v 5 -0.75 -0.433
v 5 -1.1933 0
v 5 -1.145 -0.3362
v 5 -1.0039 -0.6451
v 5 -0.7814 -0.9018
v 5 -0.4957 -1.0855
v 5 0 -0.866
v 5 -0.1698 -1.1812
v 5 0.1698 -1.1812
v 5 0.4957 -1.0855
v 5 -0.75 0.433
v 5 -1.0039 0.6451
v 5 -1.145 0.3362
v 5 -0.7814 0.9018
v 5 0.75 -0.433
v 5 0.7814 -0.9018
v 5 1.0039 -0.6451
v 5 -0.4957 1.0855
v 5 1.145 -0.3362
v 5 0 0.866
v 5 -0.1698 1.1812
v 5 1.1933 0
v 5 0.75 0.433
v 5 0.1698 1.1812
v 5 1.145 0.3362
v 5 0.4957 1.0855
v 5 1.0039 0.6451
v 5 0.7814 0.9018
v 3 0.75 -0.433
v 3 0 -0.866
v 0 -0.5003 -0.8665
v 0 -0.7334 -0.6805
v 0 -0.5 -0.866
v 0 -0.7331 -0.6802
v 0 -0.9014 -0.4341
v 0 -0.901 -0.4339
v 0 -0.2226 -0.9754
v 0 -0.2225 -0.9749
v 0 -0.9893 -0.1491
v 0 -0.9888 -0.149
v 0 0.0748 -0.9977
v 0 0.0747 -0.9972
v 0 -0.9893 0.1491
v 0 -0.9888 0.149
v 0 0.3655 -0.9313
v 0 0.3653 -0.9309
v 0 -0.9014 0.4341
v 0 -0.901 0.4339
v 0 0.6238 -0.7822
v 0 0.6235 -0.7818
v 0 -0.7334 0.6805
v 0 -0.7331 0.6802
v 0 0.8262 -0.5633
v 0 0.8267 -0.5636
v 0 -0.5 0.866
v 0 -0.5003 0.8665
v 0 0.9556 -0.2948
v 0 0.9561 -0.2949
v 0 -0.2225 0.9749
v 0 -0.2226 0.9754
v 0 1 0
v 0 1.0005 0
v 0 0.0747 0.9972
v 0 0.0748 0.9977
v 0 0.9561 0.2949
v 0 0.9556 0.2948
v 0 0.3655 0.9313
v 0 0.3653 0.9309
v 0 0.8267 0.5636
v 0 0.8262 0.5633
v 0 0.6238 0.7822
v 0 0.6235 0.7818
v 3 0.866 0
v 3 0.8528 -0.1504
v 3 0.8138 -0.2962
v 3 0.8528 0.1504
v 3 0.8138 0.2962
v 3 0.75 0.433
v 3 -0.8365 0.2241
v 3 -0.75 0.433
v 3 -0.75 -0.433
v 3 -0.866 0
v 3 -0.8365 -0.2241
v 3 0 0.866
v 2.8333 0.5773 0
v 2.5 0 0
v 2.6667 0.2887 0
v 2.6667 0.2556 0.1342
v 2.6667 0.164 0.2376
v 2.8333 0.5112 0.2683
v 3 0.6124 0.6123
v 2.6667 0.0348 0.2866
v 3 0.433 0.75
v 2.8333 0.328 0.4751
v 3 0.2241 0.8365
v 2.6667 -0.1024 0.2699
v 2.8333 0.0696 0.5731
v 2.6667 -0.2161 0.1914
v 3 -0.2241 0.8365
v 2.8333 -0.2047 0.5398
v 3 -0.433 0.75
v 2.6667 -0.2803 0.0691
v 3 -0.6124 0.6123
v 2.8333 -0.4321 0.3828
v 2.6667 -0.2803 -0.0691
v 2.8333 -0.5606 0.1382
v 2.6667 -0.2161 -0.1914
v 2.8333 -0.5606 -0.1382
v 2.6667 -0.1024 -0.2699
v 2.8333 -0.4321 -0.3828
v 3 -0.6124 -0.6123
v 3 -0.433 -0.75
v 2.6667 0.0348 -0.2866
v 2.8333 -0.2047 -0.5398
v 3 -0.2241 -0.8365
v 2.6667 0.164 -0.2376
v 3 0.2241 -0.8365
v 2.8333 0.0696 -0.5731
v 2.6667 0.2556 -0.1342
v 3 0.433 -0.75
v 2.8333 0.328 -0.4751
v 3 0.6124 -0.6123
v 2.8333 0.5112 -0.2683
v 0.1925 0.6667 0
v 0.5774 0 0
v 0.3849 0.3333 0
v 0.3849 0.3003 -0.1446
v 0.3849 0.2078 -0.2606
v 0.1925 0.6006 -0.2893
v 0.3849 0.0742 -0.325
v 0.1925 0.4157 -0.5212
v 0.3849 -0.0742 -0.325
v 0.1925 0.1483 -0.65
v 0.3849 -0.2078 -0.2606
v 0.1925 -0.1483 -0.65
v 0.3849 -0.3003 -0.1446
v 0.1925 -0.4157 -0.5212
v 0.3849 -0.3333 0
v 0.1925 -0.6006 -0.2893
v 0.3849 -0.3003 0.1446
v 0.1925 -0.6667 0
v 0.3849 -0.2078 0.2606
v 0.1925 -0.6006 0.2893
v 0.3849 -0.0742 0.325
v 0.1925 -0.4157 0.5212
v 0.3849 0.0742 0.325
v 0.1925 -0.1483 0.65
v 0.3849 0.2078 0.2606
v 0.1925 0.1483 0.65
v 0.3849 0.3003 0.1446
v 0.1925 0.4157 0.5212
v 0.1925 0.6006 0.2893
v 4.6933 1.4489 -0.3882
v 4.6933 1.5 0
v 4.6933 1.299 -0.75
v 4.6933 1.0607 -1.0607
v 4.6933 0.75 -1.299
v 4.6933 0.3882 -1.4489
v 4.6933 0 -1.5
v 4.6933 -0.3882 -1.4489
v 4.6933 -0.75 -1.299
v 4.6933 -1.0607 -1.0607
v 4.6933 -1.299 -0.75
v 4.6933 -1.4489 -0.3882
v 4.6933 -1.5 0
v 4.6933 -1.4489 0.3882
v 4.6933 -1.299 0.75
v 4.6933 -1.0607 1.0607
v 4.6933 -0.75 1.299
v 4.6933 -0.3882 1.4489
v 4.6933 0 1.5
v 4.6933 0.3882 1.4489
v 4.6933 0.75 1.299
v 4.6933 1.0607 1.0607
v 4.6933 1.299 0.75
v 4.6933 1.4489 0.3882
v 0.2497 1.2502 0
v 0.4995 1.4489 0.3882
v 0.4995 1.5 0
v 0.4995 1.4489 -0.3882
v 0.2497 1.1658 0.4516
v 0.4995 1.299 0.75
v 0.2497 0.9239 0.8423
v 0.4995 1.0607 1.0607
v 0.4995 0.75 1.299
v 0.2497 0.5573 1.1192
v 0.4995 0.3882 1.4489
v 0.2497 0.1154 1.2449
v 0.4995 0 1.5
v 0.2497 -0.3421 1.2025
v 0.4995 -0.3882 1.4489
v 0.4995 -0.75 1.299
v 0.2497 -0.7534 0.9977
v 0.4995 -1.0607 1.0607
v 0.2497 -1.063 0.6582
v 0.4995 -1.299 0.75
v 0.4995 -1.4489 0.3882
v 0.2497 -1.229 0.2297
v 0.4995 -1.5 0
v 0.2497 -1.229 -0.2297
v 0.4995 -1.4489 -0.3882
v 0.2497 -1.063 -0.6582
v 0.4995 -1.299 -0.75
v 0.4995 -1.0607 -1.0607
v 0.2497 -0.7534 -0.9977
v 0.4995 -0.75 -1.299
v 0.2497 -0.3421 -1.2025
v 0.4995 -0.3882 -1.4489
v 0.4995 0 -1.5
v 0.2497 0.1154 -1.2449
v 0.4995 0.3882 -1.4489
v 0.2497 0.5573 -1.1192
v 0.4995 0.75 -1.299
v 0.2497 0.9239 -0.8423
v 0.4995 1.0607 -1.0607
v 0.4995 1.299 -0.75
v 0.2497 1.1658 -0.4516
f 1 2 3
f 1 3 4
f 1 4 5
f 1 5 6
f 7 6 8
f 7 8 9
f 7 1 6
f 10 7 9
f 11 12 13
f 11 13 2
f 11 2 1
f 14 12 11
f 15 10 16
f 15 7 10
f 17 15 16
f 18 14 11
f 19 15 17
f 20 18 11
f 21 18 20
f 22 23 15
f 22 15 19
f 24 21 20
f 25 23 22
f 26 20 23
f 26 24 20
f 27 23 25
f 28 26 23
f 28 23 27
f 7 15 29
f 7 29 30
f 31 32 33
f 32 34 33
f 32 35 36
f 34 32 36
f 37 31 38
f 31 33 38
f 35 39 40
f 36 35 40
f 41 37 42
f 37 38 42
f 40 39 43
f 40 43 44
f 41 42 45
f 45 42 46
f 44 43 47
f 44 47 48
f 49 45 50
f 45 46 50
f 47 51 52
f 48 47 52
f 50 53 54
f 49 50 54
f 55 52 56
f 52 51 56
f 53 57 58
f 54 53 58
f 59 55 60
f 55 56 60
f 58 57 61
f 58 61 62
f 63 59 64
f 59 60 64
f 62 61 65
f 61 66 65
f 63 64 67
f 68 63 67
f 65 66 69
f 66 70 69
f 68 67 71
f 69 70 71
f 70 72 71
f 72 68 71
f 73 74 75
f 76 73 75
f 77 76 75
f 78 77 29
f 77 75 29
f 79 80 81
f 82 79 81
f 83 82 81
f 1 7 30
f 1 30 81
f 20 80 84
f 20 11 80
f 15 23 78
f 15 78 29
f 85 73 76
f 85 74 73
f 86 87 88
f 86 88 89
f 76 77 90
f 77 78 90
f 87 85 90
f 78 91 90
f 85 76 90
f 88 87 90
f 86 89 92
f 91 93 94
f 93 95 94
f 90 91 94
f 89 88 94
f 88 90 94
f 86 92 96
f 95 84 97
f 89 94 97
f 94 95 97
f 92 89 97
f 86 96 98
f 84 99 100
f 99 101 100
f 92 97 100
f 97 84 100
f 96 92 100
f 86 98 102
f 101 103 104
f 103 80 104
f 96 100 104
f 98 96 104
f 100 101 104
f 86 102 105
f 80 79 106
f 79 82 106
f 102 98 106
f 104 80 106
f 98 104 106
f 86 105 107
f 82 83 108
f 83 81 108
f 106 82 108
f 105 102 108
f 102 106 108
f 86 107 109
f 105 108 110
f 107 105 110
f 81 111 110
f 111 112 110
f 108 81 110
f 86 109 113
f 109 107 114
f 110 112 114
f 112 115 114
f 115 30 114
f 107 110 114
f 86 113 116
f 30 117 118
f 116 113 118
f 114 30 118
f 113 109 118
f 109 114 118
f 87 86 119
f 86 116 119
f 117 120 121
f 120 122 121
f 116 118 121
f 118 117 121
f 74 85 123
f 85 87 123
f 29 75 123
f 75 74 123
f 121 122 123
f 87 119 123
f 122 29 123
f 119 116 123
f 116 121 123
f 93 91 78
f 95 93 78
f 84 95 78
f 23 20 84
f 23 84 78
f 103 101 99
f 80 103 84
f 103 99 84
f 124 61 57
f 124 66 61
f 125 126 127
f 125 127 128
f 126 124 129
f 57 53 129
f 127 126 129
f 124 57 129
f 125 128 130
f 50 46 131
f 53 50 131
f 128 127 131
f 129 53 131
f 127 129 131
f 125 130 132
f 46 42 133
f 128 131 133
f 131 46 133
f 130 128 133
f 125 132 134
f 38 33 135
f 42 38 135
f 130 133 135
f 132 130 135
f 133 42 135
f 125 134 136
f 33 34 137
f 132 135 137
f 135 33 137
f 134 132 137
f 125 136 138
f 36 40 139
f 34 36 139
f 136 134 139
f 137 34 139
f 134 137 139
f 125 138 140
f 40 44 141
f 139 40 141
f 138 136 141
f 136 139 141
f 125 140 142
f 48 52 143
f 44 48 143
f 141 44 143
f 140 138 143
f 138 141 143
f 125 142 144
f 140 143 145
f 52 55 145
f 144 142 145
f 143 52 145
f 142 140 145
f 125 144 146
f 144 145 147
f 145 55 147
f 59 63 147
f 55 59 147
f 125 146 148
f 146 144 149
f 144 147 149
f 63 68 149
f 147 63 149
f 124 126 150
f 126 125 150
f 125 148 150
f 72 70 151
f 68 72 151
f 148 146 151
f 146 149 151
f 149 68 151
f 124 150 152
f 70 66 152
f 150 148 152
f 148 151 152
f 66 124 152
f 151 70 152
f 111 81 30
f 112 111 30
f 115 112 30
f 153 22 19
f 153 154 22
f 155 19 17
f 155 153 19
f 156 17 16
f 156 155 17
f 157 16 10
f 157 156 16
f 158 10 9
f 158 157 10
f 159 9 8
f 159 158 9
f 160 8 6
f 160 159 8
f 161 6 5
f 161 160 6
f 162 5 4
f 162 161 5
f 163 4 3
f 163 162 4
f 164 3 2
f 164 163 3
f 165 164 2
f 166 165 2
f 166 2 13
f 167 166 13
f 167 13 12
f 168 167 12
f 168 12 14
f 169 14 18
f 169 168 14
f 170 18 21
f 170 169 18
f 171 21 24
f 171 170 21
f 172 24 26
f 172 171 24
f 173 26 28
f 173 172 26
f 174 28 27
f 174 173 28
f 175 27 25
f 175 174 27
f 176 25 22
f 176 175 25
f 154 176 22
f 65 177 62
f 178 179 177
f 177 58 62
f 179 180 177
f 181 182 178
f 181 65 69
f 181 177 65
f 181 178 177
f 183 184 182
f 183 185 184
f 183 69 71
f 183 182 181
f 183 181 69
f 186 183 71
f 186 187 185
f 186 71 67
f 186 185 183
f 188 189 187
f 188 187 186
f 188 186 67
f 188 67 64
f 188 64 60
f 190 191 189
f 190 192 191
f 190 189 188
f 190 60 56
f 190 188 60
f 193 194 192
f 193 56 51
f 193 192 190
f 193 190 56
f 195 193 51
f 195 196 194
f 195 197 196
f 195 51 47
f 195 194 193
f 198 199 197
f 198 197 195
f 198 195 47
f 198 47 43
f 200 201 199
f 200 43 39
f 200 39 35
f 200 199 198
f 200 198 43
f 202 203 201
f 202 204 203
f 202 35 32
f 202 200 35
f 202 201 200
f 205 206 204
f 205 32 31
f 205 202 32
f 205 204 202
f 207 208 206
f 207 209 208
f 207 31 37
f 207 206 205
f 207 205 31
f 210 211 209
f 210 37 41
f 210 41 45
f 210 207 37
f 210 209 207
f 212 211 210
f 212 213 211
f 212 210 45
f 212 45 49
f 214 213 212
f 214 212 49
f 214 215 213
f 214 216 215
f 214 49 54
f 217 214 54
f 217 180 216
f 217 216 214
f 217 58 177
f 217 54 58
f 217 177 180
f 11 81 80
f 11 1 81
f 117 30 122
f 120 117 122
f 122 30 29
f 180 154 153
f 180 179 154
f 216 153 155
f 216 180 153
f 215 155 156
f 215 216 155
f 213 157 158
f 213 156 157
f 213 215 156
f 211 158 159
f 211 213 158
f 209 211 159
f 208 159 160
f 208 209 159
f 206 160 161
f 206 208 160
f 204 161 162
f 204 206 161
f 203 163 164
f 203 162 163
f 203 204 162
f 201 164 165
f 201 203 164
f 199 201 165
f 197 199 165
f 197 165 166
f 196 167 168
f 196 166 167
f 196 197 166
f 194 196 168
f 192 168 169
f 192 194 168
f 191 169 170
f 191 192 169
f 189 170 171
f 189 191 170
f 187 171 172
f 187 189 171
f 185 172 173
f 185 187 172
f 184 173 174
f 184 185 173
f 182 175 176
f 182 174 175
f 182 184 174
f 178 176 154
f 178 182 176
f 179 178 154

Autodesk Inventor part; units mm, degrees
ref_plane "YZ Plane" through (0, 0, 0) normal (1, 0, 0) x (0, 1, 0)
ref_plane "XZ Plane" through (0, 0, 0) normal (0, 1, 0) x (-1, 0, 0)
sketch "Sketch1" plane through (0, 0, 0) normal (0, 0, 1) x (1, 0, 0)
  line L0 (0.5774, 0) -> (2.5, 0)
  line L1 (5, 0.866) -> (5, 1.5)
  line L2 (5, 1.5) -> (0, 1.5)
  line L3 (5, 0.866) -> (3, 0.866)
  line L4 (3, 0.866) -> (2.5, 0)
  line L5 (0, 1) -> (0.5774, 0)
  line L6 (0, -0.3) -> (0, 1.8) projected
  line L7 (0, 1) -> (0, 1.5)
  point P0 (0, 0)
  dimension "d0" = 2
  dimension "d1" = 60
  dimension "d2" = 3
  dimension "d3" = 1.7321
  dimension "d4" = 5
  dimension "d5" = 60
  dimension "d7" = 2
revolve "Body" add sketch "Sketch1" angle 360 about axis through (0.5774, 0, 0) along (1, 0, 0)
sketch "Sketch2" plane through (5, 0, 0) normal (1, 0, 0) x (0, 0, -1)
  circle A0 centre (0, 0) radius 0.866 projected
  circle A1 centre (0, 0) radius 1.5 projected
  line L0 (0.866, 0) -> (0.433, -0.75)
  line L1 (0.433, -0.75) -> (-0.433, -0.75)
  line L2 (-0.433, -0.75) -> (-0.866, 0)
  line L3 (-0.866, 0) -> (-0.433, 0.75)
  line L4 (-0.433, 0.75) -> (0.433, 0.75)
  line L5 (0.433, 0.75) -> (0.866, 0)
extrude "Slot" add sketch "Sketch2" against normal blind 2 contours L5 A0 | A0 L0 | L4 A0 | A0 L1 | L3 A0 | A0 L2
chamfer "Chamfer1" distance 0.5 angle 45 1 edges at (0, -1.5, 0) measured on face at (0, 1.3188, -0.1197)
thread "Thread" size "M3x0.5" class "6g" standard "ISO Metric profile" length 5
chamfer "Chamfer2" distance 0.3067 angle 45 1 edges at (5, -1.5, 0) measured on face at (1.9997, 1.4951, -0.1207)
ref_plane "Work Plane1" through (2.5, 0, 0) normal (0, -0.5, -0.866) x (1, 0, 0)
equation "\"d0\" = INTI"
equation "\"d2\" = NND"
equation "\"d3\" = 1.1547 * SW"
equation "\"d4\" = NLG"
equation "\"d5\" = 0.5 * ANG"
equation "\"d7\" = SPD"
equation "\"d8\" = INTI"
equation "\"d10\" = -0.5 * SPD + 0.5 * NND"
equation "\"d11\" = FAWI"
equation "\"d33\" = -0.5 * SPD + 0.5 * NND"
equation "\"d14\" = NLG"
equation "\"d12\" = -0.5 * GD1 + 0.5 * NND"
equation "\"d13\" = FAWI"
equation "\"d34\" = -0.5 * GD1 + 0.5 * NND"
equation "\"NND\" = 3"
equation "\"NLG\" = 5"
equation "\"INTI\" = 2"
equation "\"FAWI\" = 45deg"
equation "\"SW\" = 1.5"
equation "\"GD1\" = THREADDIA - 1.2269 * PTC"
equation "\"ANG\" = 120deg"
equation "\"FAWI1\" = 45deg"
equation "\"SPD\" = 2"
equation "\"GUL\" = 0.61345 * PTC"
equation "\"TOA\" = 30deg"
equation "\"ZLG\" = 1.2"
equation "\"THREADDIA\" = 3"
equation "\"PTC\" = 0.5"
equation "\"GAL\" = 0.61345 * PTC"
equation "\"E0\" = 1.155 * SW"
properties part number "CNS 4480 - M3 x 5" material "Steel, Mild"
